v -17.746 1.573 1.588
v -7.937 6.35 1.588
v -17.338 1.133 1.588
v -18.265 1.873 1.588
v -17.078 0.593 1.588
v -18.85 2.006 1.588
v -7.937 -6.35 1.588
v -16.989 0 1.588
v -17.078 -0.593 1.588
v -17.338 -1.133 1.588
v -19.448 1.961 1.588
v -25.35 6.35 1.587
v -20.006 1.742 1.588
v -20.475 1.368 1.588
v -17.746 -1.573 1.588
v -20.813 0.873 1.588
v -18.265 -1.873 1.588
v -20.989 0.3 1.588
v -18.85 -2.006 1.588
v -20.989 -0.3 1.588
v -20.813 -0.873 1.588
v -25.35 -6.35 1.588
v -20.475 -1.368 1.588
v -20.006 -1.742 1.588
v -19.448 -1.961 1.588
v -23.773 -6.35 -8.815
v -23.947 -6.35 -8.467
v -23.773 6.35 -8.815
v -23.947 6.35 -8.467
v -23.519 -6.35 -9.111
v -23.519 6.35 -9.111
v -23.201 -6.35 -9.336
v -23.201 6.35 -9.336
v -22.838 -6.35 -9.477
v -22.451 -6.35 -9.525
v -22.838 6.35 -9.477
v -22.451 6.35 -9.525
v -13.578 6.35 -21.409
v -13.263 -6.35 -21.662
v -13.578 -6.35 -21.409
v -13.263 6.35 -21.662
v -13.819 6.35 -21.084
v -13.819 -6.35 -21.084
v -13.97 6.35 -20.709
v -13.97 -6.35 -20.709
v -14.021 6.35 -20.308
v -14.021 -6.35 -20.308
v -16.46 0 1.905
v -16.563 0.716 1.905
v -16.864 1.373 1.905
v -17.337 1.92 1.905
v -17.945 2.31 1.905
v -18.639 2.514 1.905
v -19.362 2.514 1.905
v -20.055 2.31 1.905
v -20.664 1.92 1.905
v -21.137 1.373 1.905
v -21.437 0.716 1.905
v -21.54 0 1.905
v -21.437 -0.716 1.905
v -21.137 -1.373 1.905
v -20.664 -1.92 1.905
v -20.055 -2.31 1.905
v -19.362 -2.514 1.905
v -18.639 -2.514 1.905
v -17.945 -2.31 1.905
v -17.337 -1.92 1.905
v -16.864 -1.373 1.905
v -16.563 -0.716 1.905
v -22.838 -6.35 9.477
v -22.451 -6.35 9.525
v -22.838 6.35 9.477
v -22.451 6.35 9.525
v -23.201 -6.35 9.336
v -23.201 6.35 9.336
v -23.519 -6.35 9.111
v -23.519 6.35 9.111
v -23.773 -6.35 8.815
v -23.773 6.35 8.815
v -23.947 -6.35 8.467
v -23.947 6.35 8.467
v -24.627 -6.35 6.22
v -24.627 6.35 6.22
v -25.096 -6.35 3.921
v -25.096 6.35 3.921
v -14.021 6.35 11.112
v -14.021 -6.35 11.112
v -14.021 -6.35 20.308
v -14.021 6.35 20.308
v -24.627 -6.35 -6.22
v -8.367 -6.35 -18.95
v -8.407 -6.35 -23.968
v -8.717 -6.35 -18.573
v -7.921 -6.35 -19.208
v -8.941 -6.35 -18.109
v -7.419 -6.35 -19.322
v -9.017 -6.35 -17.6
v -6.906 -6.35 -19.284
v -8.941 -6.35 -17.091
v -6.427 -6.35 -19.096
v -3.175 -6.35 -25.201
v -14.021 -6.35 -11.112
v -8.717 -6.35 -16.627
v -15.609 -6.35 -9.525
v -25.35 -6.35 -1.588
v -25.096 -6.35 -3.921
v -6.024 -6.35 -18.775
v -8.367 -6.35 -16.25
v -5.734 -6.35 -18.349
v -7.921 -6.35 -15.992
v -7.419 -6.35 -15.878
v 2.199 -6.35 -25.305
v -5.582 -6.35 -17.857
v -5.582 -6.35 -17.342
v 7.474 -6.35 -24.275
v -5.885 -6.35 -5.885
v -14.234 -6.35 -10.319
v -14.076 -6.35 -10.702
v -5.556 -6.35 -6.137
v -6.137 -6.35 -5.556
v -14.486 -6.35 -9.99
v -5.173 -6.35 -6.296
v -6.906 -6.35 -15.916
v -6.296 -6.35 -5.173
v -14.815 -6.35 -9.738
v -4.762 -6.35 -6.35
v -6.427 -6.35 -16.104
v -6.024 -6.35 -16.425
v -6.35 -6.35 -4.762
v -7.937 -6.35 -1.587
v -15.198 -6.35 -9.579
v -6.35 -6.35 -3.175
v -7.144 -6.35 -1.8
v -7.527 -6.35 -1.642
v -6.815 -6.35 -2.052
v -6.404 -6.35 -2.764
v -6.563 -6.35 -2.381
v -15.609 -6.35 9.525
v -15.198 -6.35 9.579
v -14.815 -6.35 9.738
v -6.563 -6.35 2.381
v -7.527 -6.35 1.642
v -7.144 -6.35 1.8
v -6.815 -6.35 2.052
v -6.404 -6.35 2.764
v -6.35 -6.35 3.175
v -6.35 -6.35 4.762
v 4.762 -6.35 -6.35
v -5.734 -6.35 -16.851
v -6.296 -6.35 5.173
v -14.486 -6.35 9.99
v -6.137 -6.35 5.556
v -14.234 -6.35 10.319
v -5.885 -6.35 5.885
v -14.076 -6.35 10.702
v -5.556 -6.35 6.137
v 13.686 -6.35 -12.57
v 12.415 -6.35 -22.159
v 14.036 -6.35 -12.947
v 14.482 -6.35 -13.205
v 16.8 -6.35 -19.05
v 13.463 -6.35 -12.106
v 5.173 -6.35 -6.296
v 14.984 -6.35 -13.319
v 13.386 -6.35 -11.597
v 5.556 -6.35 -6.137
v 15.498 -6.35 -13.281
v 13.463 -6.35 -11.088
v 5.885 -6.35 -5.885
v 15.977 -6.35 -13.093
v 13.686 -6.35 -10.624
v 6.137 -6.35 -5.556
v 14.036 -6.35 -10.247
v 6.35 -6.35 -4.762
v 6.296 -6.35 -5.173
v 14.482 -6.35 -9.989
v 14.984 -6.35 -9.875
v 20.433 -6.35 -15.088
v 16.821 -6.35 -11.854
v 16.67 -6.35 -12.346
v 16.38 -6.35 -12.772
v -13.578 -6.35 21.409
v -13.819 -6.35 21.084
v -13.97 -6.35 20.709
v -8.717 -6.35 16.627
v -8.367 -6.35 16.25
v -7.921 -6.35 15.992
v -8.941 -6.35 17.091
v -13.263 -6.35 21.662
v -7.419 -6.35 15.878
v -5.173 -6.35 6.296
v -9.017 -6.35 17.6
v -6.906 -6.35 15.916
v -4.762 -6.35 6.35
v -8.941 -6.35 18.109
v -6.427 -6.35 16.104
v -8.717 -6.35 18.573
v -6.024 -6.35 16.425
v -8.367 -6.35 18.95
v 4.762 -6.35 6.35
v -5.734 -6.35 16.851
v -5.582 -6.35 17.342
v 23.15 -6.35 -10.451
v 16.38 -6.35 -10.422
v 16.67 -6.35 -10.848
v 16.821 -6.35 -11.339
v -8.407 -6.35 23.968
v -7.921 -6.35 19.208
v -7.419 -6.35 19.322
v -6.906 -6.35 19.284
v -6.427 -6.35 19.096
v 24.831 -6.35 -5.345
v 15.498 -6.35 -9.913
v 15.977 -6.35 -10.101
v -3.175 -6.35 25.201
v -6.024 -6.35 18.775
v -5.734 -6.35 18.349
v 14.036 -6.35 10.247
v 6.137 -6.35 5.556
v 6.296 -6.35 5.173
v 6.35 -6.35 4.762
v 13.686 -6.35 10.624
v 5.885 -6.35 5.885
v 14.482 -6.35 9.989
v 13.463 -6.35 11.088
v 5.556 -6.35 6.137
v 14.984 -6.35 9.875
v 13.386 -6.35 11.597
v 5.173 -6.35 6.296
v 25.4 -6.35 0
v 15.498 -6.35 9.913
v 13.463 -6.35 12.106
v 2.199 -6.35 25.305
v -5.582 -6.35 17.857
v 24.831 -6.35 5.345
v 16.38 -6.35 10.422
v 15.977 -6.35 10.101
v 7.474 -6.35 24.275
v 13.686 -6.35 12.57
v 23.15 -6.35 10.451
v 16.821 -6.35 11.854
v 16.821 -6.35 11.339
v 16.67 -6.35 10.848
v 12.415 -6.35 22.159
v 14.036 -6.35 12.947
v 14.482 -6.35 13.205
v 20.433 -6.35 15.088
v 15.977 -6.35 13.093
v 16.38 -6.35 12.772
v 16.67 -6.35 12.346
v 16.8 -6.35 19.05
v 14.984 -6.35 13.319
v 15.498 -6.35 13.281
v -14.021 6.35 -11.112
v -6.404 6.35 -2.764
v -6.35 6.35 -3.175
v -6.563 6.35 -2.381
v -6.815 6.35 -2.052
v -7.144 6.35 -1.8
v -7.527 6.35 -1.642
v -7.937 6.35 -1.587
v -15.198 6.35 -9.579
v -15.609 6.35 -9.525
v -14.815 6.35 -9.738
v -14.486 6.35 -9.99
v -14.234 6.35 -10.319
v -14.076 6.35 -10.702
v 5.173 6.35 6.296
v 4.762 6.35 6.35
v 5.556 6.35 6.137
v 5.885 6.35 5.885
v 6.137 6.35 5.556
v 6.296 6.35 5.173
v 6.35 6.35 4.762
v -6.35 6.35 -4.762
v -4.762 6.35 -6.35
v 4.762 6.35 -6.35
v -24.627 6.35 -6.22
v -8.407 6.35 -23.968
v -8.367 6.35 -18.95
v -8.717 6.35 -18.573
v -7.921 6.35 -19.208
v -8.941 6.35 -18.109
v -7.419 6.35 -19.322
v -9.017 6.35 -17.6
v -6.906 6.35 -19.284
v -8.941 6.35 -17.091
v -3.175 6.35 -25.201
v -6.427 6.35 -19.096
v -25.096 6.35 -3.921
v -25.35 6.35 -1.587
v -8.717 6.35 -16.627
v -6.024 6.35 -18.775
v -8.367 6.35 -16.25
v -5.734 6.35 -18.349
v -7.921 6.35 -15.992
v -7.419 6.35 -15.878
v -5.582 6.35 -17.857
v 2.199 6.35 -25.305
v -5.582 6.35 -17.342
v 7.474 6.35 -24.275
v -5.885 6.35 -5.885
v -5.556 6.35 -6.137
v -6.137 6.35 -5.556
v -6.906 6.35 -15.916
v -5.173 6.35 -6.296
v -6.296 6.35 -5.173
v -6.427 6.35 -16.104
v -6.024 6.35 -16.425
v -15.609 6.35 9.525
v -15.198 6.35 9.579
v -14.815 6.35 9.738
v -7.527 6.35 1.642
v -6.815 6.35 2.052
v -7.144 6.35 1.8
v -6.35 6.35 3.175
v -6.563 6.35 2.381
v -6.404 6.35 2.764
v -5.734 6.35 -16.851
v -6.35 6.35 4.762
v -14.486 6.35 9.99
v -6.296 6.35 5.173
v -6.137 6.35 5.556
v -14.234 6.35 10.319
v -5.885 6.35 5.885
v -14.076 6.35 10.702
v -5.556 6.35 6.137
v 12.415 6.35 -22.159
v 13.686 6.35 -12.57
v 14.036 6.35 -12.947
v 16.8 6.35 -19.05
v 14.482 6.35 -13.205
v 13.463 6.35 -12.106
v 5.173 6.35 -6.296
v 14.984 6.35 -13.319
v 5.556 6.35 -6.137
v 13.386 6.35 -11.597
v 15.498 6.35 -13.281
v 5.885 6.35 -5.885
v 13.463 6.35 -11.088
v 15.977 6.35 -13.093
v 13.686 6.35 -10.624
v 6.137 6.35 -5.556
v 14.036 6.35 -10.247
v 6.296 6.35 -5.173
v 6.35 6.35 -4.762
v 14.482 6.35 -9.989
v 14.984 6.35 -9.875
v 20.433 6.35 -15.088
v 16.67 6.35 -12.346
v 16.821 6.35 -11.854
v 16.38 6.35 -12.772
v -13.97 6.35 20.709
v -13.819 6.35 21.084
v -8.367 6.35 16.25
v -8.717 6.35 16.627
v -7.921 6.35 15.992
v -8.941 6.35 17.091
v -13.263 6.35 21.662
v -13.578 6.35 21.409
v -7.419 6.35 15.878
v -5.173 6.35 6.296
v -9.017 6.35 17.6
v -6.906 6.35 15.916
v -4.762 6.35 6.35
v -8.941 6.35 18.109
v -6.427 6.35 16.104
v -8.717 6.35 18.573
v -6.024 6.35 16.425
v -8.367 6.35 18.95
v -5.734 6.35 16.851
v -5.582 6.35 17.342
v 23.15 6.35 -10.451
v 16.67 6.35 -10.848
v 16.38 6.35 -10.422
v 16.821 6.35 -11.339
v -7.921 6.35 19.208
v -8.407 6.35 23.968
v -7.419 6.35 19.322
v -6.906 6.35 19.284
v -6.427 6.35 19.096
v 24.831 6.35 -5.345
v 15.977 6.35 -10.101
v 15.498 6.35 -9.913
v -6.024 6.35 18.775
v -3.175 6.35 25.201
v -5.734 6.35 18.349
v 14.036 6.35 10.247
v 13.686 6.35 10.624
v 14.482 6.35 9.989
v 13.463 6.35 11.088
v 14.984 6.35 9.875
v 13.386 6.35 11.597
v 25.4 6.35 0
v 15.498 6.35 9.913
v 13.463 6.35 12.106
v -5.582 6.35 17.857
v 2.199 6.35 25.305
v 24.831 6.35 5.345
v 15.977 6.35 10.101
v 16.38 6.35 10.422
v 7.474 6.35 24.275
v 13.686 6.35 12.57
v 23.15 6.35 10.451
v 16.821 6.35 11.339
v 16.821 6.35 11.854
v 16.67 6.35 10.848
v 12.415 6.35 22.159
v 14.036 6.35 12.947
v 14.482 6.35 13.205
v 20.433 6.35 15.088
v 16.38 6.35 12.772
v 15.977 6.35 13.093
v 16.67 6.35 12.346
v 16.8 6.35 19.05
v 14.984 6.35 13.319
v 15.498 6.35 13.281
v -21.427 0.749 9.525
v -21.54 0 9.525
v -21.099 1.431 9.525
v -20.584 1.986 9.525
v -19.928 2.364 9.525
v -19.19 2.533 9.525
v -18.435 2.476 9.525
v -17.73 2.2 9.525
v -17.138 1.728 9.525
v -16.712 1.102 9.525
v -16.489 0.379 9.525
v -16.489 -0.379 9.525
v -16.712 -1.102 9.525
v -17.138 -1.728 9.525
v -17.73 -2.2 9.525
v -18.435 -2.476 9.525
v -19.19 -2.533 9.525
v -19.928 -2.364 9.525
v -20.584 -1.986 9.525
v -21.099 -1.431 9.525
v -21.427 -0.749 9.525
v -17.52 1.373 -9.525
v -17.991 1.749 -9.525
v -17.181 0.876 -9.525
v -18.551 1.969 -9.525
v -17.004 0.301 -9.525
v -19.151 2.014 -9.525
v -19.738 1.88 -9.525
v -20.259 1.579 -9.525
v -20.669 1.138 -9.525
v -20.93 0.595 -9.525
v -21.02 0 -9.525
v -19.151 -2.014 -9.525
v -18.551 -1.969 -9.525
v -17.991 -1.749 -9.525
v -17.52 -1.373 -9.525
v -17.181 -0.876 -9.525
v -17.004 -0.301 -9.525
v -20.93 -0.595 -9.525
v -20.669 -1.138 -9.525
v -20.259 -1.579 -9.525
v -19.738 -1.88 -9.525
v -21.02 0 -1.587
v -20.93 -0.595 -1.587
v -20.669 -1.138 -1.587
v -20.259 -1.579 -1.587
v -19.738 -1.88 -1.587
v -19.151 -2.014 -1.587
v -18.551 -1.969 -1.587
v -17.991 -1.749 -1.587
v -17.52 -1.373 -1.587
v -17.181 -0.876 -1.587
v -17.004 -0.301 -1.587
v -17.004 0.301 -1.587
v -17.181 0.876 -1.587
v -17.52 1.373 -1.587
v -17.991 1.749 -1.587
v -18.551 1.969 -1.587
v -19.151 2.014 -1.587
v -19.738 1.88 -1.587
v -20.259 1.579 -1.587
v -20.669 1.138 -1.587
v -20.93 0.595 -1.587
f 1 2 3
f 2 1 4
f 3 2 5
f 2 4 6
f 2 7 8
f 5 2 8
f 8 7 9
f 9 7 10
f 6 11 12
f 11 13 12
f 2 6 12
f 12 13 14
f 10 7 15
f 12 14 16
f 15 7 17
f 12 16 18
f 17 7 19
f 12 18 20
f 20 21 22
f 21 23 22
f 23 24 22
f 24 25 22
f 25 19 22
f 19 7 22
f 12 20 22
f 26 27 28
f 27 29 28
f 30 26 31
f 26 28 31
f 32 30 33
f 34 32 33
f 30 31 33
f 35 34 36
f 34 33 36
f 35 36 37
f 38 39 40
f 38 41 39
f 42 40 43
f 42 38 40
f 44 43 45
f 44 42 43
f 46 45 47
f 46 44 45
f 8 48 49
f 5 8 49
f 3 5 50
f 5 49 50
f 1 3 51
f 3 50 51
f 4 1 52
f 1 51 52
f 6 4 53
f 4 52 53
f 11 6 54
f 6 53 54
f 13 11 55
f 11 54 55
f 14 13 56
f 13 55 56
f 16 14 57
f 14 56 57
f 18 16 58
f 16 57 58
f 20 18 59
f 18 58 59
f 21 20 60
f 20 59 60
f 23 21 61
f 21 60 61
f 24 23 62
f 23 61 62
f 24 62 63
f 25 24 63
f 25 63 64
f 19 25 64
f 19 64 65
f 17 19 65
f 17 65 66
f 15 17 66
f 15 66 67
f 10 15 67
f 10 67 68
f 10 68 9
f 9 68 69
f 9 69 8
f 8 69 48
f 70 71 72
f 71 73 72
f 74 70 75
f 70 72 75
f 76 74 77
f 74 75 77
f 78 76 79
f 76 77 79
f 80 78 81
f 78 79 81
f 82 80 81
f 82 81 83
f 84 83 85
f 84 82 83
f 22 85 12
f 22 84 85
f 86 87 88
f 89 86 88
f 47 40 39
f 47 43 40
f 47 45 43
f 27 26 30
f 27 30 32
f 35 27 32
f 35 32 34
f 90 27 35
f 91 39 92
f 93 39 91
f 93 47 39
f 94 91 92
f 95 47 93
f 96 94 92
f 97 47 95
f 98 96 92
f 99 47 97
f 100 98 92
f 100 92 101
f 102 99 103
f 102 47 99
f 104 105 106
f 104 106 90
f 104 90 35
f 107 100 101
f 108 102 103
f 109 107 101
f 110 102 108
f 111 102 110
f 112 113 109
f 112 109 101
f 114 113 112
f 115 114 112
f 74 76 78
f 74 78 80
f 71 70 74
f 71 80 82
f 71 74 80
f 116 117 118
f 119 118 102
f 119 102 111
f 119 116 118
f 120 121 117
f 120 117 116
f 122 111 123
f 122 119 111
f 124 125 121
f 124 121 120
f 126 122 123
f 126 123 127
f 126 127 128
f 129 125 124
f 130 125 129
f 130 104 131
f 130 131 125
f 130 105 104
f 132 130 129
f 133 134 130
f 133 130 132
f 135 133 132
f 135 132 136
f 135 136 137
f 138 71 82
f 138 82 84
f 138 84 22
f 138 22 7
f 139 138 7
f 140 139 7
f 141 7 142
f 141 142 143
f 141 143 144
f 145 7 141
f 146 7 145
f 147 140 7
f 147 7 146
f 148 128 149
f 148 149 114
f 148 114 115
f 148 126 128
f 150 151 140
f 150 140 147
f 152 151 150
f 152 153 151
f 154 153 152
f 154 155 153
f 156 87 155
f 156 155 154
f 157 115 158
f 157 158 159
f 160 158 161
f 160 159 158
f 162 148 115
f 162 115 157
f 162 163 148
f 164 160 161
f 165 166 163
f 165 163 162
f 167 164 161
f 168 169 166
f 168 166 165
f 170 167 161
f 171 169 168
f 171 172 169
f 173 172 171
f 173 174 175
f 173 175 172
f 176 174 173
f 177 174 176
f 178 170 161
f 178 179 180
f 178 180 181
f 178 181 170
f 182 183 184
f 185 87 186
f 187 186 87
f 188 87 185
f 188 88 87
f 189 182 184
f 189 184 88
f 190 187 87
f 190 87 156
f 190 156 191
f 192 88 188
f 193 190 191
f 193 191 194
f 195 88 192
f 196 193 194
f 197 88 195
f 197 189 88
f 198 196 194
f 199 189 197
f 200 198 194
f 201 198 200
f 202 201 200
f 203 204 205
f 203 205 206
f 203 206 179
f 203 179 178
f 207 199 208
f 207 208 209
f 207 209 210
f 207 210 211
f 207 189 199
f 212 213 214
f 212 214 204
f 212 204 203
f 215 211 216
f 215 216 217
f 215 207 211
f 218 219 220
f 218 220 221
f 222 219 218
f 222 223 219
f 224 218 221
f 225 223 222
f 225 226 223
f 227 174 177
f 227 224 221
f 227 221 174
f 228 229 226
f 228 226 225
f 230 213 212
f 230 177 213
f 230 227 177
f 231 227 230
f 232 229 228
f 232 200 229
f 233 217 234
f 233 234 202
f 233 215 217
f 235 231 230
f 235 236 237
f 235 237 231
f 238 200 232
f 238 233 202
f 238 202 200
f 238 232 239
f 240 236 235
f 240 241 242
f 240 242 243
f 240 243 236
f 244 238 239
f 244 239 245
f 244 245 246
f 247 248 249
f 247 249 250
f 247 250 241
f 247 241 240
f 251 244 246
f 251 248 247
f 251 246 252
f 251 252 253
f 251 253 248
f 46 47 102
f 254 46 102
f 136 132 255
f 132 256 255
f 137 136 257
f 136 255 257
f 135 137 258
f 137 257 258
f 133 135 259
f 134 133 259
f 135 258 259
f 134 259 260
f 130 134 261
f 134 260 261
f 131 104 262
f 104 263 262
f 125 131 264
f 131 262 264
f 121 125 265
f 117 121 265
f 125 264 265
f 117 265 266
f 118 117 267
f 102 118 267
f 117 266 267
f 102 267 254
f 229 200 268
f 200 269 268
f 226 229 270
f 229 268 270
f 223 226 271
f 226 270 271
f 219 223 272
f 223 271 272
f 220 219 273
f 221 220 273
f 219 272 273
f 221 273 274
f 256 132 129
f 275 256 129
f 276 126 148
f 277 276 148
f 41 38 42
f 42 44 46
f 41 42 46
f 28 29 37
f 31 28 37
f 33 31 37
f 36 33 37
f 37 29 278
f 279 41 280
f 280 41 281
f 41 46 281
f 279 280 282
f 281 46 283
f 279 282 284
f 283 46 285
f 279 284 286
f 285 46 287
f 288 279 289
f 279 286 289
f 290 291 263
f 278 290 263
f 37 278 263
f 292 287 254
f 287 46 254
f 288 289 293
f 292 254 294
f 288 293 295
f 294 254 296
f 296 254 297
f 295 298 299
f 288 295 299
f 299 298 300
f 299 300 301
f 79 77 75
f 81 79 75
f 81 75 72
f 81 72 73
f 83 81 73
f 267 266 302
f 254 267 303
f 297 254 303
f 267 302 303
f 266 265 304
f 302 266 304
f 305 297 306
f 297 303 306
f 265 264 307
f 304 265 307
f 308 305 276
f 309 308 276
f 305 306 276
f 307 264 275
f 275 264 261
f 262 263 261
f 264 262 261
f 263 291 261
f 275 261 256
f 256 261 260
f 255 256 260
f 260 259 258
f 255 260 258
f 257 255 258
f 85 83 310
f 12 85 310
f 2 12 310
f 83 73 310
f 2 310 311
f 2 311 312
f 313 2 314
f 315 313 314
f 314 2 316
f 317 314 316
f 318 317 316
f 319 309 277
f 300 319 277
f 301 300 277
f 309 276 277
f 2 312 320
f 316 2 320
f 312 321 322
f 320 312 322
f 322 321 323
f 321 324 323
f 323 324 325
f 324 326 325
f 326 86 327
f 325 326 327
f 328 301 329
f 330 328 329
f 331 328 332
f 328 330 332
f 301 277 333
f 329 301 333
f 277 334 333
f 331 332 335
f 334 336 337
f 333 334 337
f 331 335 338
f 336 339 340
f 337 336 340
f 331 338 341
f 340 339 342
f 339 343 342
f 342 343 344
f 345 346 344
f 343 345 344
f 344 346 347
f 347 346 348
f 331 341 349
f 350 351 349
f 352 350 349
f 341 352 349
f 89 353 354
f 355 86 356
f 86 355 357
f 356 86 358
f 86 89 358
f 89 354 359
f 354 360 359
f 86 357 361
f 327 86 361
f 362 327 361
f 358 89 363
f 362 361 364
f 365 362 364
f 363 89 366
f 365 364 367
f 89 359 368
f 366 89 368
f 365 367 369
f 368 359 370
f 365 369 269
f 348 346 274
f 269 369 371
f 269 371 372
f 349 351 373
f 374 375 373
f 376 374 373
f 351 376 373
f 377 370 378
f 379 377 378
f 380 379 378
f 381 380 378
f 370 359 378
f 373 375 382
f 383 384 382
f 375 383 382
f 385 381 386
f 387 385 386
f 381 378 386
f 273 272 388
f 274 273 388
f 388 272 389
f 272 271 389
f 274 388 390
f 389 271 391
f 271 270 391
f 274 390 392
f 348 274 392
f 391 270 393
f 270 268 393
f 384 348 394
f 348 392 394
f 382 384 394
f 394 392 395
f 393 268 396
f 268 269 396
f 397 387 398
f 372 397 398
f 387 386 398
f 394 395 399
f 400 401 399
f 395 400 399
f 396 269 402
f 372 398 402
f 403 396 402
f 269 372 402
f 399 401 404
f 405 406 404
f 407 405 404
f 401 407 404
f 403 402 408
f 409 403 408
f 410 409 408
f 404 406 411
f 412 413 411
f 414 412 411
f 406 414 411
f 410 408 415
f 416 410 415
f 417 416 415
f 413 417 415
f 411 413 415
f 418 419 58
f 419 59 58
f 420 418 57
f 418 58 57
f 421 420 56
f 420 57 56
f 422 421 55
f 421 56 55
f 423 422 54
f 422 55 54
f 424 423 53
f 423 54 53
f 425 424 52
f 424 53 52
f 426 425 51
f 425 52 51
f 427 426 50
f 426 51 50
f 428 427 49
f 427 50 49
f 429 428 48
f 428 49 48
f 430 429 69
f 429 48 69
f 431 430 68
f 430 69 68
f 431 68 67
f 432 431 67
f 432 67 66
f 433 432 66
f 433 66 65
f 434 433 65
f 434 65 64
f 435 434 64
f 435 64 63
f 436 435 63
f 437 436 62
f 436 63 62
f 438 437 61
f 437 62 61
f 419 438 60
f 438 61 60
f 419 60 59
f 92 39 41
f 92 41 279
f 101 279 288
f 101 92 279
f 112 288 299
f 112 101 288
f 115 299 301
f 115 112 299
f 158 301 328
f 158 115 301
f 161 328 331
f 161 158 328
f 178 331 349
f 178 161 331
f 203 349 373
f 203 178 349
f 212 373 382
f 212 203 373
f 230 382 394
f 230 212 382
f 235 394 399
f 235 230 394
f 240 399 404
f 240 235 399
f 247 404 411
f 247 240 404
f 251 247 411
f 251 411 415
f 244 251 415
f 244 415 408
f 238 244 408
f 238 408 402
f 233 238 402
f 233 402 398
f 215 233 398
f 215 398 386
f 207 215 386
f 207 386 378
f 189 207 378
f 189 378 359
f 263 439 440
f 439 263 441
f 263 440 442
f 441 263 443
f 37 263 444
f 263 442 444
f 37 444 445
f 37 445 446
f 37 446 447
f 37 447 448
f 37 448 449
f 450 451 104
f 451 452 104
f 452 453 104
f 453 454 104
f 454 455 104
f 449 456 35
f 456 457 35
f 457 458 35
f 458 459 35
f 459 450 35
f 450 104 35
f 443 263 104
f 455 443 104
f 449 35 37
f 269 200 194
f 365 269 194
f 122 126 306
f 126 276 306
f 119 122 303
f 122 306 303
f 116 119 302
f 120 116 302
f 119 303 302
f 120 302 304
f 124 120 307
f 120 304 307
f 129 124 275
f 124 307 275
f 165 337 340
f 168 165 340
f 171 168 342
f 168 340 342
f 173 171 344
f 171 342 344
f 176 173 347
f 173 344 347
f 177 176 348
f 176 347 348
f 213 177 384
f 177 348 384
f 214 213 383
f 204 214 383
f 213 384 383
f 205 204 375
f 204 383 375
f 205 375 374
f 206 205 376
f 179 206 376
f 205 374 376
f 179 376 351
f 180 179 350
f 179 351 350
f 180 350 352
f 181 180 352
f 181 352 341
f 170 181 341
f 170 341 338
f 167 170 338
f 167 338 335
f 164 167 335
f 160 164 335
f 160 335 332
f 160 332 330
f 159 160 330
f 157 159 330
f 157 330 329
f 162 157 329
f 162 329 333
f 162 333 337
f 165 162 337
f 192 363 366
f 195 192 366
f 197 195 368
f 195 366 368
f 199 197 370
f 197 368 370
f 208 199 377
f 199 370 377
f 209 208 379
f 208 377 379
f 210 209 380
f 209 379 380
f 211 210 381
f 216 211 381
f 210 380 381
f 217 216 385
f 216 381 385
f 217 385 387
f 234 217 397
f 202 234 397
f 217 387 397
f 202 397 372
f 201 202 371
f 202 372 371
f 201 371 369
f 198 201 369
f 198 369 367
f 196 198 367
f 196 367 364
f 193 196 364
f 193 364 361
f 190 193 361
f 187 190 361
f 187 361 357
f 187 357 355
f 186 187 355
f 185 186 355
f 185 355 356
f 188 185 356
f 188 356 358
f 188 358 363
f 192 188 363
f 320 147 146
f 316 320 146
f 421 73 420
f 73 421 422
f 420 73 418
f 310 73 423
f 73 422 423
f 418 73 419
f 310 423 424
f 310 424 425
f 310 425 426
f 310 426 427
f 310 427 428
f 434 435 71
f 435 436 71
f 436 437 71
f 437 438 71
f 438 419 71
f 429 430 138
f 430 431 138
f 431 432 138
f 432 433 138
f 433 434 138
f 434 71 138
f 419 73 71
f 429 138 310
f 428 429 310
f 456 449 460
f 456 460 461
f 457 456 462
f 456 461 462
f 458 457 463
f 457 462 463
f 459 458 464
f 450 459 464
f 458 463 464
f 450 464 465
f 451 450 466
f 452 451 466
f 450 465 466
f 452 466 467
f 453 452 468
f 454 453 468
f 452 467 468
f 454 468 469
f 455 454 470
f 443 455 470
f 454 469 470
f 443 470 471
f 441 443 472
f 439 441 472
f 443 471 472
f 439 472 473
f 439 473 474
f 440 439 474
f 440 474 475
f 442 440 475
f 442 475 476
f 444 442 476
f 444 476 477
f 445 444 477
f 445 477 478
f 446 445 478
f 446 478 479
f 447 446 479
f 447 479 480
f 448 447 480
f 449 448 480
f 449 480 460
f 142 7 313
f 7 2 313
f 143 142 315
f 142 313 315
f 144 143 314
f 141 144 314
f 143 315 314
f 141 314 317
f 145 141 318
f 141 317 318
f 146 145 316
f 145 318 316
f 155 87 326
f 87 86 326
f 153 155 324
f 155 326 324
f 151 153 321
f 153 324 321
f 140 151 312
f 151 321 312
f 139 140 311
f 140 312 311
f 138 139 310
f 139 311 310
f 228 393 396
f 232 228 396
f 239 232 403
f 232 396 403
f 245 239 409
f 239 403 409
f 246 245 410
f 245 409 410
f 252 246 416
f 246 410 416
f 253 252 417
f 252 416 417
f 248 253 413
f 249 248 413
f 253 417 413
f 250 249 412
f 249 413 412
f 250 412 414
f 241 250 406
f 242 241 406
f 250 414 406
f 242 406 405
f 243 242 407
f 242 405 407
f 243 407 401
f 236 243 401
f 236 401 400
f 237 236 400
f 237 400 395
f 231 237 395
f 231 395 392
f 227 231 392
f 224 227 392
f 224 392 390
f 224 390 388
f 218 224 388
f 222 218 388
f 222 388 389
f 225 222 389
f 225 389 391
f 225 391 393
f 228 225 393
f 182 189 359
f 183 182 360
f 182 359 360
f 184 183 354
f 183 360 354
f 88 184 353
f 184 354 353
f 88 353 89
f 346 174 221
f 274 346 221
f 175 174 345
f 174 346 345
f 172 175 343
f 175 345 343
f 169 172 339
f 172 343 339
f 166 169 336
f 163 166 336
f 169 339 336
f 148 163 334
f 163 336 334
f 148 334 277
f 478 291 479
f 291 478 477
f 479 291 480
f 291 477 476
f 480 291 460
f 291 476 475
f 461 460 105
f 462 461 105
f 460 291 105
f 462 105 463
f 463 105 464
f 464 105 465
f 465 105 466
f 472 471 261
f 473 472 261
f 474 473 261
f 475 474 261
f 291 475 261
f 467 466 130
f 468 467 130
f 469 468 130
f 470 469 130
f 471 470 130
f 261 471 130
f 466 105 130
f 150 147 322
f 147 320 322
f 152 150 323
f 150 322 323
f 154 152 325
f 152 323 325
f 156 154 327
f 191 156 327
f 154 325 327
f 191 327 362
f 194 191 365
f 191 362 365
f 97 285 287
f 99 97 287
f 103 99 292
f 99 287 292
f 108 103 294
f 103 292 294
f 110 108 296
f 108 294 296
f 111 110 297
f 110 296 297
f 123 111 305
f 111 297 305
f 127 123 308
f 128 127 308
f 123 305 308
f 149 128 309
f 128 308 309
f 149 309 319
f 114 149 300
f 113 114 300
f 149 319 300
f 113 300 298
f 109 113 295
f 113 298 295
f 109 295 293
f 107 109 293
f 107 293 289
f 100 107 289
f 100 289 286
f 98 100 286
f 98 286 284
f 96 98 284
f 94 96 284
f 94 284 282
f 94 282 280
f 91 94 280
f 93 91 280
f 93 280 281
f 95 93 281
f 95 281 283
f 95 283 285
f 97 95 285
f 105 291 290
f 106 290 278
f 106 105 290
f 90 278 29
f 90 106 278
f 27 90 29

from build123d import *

# Parameters (mm, degrees)
F0_R      = 25.4
F1_DEPTH  = 6.35
F3_DEPTH  = 25.4
F5_DEPTH  = 25.4
F6_R      = 1.5875
F8_D      = 3.4544
F10_D     = 5.08
F10_DEPTH = 7.62
F10_TIP   = 1.5261859723
F12_D     = 4.0386
F12_DEPTH = 10.00125
F12_TIP   = 1.213317848


with BuildPart() as f1:
    # F0 (on Front) → F1 (new body, symmetric)
    with BuildSketch(Plane.XZ):
        Circle(F0_R)
    extrude(amount=F1_DEPTH, both=True)

    # F2 (on face) → F3 (cut)
    with BuildSketch(Plane.XZ.offset(6.35)):
        with BuildLine():
            Line((-6.35, -1.5875), (-6.35, 1.5875))
            Line((-6.35, 1.5875), (-25.3503420835, 1.5875))
            ThreePointArc((-25.3503420835, 1.5875), (-25.3875824855, 0.7941382371), (-25.4, 0))
            ThreePointArc((-25.4, 0), (-25.3875824855, -0.7941382371), (-25.3503420835, -1.5875))
            Line((-25.3503420835, -1.5875), (-6.35, -1.5875))
        make_face()
        Polygon((6.35, 6.35), (-6.35, 6.35), (-6.35, 1.5875), (-6.35, -1.5875), (-6.35, -6.35), (6.35, -6.35), align=None)
    extrude(amount=-F3_DEPTH, mode=Mode.SUBTRACT)

    # F4 (on face) → F5 (cut)
    with BuildSketch(Plane.XZ.offset(6.35)):
        with BuildLine():
            Line((-23.5464301965, 9.525), (-14.0214301965, 9.525))
            Line((-14.0214301965, 9.525), (-14.0214301965, 21.1792231974))
            ThreePointArc((-14.0214301965, 21.1792231974), (-19.6670095137, 16.0738525808), (-23.5464301965, 9.525))
        make_face()
        with BuildLine():
            ThreePointArc((-23.5464301965, -9.525), (-19.6670095137, -16.0738525808), (-14.0214301965, -21.1792231974))
            Line((-14.0214301965, -21.1792231974), (-14.0214301965, -9.525))
            Line((-14.0214301965, -9.525), (-23.5464301965, -9.525))
        make_face()
    extrude(amount=-F5_DEPTH, mode=Mode.SUBTRACT)

    # F6
    f6_edges = [f1.edges().sort_by_distance(p)[0] for p in [
        (-23.54643, 0, 9.525),
        (-14.02143, 0, 21.179223),
        (-14.02143, 0, 9.525),
        (-6.35, 0, 6.35),
        (-6.35, 0, 1.5875),
        (-6.35, 0, -1.5875),
        (-6.35, 0, -6.35),
        (6.35, 0, 6.35),
        (6.35, 0, -6.35),
        (-23.54643, 0, -9.525),
        (-14.02143, 0, -9.525),
        (-14.02143, 0, -21.179223),
    ]]
    fillet(f6_edges, radius=F6_R)

    # F8 (through all)
    with Locations(Plane.XZ.offset(6.35)):
        with Locations((-7.2901193866, 17.5999050943), (15.1133811325, 11.5969052226), (15.1133811325, -11.5969052226), (-7.2901193866, -17.5999050943)):
            Hole(F8_D / 2)

    # F10
    with Locations(Plane.XY.offset(9.525)):
        with Locations((-19.0003420835, 0)):
            Hole(F10_D / 2, depth=F10_DEPTH)
            with Locations((0, 0, -(F10_DEPTH + F10_TIP / 2))):  # 118° drill point
                Cone(0, F10_D / 2, F10_TIP, mode=Mode.SUBTRACT)

    # F12
    with Locations(Plane(origin=(0, 0, -9.525), x_dir=(1, 0, 0), z_dir=(0, 0, -1))):
        with Locations((-19.0003420835, 0)):
            Hole(F12_D / 2, depth=F12_DEPTH)
            with Locations((0, 0, -(F12_DEPTH + F12_TIP / 2))):  # 118° drill point
                Cone(0, F12_D / 2, F12_TIP, mode=Mode.SUBTRACT)


solid = f1.part
